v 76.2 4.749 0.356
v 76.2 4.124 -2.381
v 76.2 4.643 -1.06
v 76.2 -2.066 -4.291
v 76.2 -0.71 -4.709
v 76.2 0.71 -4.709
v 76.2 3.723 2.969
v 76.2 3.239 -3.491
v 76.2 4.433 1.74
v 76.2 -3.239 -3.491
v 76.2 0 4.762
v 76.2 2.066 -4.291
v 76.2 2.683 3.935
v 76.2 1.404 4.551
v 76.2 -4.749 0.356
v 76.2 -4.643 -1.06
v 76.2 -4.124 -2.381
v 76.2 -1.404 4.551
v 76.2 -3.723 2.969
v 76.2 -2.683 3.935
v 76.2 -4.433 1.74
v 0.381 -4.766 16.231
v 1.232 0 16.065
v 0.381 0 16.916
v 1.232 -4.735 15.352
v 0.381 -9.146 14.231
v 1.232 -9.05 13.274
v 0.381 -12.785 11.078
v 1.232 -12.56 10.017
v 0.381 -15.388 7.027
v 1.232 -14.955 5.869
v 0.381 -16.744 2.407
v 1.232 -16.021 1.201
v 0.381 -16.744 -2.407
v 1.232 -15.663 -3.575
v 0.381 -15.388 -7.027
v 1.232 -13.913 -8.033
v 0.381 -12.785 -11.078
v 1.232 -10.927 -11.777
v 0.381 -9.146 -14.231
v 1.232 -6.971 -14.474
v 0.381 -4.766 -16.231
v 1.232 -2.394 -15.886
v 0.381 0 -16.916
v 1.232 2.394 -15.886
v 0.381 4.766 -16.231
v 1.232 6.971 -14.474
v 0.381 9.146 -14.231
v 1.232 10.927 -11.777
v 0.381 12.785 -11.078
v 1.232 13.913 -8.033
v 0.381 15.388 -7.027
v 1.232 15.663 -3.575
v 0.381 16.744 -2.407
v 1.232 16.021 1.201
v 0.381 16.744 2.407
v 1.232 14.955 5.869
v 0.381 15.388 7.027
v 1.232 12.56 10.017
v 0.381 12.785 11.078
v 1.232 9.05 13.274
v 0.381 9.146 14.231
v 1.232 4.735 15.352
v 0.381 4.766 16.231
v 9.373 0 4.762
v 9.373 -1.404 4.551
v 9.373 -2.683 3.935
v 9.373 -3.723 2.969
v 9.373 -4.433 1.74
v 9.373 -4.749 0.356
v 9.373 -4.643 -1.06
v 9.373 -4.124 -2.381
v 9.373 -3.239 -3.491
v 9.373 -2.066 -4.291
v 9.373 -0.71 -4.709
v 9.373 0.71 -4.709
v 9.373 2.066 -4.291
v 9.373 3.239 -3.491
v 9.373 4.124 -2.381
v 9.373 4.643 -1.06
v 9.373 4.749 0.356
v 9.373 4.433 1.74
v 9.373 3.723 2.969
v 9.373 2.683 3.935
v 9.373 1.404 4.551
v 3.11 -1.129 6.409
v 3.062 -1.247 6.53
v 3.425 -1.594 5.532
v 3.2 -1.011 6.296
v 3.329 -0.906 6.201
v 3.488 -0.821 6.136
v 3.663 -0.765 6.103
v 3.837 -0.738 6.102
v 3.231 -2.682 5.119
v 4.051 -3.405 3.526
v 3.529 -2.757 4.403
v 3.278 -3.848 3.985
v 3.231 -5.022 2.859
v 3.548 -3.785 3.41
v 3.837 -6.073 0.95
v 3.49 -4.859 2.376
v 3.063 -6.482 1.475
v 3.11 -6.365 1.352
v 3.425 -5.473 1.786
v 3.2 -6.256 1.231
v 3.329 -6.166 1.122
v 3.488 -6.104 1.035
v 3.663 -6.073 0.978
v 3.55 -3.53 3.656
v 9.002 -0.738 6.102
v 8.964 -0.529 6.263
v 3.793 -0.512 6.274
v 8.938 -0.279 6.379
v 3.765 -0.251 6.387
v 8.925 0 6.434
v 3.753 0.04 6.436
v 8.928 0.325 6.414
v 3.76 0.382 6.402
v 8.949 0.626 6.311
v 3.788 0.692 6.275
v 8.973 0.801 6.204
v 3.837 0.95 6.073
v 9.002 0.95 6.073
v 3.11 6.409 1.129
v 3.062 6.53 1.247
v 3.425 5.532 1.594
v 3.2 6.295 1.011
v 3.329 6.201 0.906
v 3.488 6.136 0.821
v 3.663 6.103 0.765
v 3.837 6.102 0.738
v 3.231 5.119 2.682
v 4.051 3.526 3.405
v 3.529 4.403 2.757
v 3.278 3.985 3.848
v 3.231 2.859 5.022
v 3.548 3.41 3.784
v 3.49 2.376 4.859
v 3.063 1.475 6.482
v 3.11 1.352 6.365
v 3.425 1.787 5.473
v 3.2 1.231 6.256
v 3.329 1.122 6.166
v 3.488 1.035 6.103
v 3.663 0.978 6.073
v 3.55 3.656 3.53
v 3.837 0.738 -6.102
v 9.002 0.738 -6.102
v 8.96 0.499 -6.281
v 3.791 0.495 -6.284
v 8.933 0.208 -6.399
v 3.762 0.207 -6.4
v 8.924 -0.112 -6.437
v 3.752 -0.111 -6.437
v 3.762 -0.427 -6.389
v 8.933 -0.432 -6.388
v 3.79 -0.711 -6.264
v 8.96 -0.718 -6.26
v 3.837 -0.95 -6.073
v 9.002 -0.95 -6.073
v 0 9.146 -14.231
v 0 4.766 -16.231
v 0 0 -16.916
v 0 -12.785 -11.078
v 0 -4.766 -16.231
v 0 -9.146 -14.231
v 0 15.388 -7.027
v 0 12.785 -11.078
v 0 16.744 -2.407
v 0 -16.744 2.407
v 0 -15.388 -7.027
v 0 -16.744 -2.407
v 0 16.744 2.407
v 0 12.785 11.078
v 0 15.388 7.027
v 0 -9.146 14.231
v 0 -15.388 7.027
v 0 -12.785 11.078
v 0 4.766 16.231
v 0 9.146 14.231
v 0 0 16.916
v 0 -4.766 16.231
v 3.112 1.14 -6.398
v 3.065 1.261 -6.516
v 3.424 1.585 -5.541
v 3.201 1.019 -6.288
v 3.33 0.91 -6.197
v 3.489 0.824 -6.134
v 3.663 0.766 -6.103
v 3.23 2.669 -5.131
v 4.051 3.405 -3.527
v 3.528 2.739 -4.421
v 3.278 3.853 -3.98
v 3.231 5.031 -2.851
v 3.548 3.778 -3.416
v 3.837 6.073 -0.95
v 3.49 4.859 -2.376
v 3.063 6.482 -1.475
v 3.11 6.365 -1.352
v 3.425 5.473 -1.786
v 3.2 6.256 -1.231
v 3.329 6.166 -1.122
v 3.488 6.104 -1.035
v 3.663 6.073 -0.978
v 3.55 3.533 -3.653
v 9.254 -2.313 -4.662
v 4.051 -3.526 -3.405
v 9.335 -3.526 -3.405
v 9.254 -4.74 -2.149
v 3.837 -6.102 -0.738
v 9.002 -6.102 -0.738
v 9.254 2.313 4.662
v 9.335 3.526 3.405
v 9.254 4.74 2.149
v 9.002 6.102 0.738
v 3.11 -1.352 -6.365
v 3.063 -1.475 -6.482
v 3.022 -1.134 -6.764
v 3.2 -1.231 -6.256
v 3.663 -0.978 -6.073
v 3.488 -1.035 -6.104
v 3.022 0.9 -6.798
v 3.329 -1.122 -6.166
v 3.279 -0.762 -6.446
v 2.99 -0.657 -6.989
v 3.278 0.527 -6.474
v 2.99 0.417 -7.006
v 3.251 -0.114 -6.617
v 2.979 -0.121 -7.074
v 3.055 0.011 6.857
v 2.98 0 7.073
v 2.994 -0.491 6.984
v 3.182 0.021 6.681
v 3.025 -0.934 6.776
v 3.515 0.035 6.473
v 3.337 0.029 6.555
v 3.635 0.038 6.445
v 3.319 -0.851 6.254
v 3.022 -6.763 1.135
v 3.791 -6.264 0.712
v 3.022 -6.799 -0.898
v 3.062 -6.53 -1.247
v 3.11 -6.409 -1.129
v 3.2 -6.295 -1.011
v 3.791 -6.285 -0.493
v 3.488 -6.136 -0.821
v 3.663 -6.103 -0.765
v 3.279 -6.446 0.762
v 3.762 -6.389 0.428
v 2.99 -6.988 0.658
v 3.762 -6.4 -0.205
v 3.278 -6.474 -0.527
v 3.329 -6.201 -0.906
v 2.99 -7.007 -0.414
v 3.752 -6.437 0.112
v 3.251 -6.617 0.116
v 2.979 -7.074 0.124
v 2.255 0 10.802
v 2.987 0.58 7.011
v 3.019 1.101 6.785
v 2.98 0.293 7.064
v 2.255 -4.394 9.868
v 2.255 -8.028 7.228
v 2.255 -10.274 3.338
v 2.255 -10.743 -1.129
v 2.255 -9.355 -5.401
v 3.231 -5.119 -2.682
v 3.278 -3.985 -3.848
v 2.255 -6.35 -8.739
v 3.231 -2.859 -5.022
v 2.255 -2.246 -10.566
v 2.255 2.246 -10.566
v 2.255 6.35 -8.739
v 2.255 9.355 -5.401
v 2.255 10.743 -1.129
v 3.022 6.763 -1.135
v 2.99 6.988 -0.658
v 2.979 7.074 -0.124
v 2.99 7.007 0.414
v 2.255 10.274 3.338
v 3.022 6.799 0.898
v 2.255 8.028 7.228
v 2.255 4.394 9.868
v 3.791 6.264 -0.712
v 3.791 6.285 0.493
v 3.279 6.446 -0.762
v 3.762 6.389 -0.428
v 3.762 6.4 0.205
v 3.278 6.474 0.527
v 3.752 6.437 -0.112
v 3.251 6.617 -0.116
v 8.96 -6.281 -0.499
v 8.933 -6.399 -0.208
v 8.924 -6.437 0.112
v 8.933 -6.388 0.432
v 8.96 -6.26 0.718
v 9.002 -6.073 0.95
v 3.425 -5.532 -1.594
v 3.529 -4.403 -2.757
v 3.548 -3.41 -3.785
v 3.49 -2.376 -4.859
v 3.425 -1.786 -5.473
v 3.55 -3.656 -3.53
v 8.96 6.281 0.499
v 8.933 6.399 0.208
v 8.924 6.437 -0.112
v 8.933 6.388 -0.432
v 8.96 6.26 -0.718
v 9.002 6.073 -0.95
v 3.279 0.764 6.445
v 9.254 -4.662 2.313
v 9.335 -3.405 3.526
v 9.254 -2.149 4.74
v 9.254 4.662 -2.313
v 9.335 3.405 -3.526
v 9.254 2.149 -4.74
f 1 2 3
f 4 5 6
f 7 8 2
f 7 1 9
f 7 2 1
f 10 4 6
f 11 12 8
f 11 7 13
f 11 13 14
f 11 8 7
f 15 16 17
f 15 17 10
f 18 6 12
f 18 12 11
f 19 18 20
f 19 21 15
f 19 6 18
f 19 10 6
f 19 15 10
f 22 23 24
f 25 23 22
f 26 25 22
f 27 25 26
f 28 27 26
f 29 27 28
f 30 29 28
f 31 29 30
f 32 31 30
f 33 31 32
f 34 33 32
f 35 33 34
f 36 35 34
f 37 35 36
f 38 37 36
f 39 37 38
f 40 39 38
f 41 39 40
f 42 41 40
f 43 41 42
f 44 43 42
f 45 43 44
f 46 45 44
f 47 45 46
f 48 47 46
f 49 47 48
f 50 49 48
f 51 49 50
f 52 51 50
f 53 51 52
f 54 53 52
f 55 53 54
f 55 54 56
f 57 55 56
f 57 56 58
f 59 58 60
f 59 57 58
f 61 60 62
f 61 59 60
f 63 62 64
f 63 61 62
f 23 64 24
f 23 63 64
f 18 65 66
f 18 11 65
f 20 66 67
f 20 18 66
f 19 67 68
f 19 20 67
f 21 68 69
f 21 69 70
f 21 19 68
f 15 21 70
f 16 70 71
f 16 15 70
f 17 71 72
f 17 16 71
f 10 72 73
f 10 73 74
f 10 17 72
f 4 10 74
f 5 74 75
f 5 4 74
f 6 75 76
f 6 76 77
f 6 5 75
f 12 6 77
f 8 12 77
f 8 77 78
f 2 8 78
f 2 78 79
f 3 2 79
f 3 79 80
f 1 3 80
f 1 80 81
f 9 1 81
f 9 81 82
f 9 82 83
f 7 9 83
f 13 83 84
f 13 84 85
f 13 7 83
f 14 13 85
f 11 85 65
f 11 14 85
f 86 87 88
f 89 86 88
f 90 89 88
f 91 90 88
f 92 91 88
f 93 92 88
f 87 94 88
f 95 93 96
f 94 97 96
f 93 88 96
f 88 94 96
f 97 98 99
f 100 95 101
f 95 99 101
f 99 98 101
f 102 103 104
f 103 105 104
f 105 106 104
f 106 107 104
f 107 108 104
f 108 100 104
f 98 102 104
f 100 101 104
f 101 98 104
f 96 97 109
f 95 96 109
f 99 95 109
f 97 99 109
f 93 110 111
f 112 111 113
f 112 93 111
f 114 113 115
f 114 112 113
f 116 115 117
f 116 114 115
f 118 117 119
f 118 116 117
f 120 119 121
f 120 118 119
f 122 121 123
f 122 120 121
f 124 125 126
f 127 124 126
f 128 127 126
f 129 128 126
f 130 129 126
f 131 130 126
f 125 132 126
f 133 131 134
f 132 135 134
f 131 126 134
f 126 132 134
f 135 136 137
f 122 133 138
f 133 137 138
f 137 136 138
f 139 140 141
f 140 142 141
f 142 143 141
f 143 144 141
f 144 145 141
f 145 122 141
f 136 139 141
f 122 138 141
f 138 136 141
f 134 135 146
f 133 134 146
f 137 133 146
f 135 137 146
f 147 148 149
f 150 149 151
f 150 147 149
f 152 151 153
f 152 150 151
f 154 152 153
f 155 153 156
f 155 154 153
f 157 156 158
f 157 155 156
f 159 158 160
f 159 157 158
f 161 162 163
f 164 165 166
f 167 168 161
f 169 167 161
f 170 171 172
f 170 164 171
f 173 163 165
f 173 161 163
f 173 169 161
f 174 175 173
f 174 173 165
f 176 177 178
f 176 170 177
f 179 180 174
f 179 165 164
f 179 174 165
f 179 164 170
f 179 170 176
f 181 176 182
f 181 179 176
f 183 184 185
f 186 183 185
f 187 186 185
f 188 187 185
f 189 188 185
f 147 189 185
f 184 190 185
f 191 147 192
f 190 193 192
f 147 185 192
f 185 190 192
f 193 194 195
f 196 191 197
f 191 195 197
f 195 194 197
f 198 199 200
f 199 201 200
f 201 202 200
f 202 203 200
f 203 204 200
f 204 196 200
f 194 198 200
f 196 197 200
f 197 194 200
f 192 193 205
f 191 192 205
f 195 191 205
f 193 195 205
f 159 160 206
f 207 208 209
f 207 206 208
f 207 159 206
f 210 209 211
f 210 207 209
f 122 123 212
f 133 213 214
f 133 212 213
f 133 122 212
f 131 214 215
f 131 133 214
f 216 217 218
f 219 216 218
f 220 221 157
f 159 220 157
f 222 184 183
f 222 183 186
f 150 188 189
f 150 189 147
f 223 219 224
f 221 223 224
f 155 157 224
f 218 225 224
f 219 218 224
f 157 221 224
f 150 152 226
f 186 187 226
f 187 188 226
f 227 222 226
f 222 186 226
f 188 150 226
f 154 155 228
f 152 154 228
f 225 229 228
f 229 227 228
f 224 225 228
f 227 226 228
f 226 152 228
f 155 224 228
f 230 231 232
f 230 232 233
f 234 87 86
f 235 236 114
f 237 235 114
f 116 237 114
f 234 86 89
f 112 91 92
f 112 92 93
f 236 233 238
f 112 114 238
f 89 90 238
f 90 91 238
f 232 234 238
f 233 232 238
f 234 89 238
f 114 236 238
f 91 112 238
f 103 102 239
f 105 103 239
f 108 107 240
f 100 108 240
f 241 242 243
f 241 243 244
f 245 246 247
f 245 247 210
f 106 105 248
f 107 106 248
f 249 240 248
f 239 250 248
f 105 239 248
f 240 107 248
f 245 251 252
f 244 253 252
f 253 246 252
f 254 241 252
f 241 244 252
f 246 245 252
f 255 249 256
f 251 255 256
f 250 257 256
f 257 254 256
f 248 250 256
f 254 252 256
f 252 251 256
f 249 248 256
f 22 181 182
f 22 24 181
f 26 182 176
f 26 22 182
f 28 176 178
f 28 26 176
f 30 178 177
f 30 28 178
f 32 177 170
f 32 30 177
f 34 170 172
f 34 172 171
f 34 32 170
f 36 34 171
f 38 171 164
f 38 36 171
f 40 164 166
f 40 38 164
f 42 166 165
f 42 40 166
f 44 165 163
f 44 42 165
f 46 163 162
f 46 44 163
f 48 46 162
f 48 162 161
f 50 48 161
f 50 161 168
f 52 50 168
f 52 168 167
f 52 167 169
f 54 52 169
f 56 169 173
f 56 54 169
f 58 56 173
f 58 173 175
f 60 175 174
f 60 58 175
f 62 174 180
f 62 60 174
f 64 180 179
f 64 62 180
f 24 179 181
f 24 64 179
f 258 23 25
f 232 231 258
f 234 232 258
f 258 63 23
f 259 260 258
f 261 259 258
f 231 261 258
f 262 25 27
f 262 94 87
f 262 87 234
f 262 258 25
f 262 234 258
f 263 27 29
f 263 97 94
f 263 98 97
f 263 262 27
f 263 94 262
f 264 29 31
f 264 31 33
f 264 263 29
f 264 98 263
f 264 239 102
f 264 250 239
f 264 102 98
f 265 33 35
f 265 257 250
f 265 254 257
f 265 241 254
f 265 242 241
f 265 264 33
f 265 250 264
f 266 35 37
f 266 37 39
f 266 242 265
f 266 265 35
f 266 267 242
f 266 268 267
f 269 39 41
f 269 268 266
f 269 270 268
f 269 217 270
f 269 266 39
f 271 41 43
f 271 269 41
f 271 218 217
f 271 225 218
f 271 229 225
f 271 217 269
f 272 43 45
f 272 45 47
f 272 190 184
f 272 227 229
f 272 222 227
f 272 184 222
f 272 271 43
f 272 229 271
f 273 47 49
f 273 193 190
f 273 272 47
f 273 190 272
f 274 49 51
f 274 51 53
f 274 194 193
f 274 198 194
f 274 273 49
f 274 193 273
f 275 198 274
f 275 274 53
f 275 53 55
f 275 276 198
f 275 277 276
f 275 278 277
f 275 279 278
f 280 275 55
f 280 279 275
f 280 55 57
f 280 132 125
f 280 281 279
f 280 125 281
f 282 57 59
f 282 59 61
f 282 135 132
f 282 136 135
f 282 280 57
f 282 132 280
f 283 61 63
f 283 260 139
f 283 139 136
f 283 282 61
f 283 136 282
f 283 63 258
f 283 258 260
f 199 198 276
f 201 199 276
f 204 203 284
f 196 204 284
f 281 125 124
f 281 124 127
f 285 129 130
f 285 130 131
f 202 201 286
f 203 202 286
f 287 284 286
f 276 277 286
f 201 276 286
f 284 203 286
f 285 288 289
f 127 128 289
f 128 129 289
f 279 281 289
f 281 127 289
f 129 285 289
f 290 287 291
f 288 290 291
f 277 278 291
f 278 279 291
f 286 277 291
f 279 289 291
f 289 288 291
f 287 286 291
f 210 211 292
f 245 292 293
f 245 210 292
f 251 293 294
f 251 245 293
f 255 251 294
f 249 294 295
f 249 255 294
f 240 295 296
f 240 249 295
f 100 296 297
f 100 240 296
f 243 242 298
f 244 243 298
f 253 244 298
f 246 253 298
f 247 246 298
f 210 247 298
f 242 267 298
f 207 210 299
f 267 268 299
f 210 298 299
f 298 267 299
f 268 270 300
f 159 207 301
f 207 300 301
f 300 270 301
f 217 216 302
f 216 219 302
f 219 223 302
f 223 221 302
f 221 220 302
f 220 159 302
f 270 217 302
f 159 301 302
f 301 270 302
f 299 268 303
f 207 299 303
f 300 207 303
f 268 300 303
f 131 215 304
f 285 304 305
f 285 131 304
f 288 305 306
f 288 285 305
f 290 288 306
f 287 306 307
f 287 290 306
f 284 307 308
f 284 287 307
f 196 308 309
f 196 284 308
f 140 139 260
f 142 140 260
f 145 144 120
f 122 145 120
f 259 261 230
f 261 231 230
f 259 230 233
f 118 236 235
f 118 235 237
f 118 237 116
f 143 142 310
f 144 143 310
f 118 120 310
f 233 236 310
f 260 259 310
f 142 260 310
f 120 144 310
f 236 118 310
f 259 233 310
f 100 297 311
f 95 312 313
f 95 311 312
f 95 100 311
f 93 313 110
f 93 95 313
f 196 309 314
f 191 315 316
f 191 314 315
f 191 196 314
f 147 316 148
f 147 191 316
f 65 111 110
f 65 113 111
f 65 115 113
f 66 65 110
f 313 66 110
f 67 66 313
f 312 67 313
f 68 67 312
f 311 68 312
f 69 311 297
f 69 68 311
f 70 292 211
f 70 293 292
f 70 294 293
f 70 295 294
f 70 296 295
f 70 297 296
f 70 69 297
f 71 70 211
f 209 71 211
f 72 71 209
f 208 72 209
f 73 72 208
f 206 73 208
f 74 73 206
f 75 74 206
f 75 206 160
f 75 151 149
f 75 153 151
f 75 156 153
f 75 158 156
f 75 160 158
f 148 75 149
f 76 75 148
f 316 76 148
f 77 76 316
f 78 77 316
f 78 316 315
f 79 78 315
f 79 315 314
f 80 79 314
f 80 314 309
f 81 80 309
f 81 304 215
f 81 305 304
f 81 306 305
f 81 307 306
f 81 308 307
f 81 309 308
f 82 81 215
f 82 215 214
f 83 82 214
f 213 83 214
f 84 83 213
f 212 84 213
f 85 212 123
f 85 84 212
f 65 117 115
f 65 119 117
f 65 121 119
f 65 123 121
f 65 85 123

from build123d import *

# Parameters (mm, degrees)
NECK_DEPTH   = 9.3726
HEADFILLET_R = 0.7874


with BuildPart() as part:
    # BodySke → BaseBody (revolve)
    with BuildSketch(Plane.XY, mode=Mode.PRIVATE) as basebody_sk:
        Polygon((0, 0), (0, 16.9164), (0.381, 16.9164), (1.231924038, 16.065475962), (3.429, 4.7625), (76.2, 4.7625), (76.2, 0), align=None)
    revolve(basebody_sk.sketch.rotate(Axis((-6.35, 0, 0), (1, 0, 0)), 90), axis=Axis((-6.35, 0, 0), (1, 0, 0)))

    # Sketch2 → Neck (add)
    with BuildSketch(Plane(origin=(0, 0, 0), x_dir=(0, 0.6946583704589985, -0.7193398003386501), z_dir=(1, 0, 0))):
        with BuildLine():
            Line((3.7084, -4.9022), (-3.7084, -4.9022))
            ThreePointArc((-3.7084, -4.9022), (-4.552544075, -4.552544075), (-4.9022, -3.7084))
            Line((-4.9022, -3.7084), (-4.9022, 3.7084))
            ThreePointArc((-4.9022, 3.7084), (-4.552544075, 4.552544075), (-3.7084, 4.9022))
            Line((-3.7084, 4.9022), (3.7084, 4.9022))
            ThreePointArc((3.7084, 4.9022), (4.552544075, 4.552544075), (4.9022, 3.7084))
            Line((4.9022, 3.7084), (4.9022, -3.7084))
            ThreePointArc((4.9022, -3.7084), (4.552544075, -4.552544075), (3.7084, -4.9022))
        make_face()
    extrude(amount=NECK_DEPTH)

    # Sketch3 → NeckChamfer (revolve, cut)
    with BuildSketch(Plane.XY, mode=Mode.PRIVATE) as neckchamfer_sk:
        Polygon((2.713017566, 29.6164), (9.3726, 4.7625), (9.6266, 4.7625), (9.6266, 29.6164), align=None)
    revolve(neckchamfer_sk.sketch.rotate(Axis((0, 0, 0), (1, 0, 0)), 90), axis=Axis((0, 0, 0), (1, 0, 0)), mode=Mode.SUBTRACT)

    # HeadFillet
    headfillet_edges = [part.edges().sort_by_distance(p)[0] for p in [
        (3.401845071, 3.405354264, -3.526347569),
        (3.103263392, -0.112363299, -6.437288995),
        (3.401845071, -3.526347569, -3.405354264),
        (3.103263392, -6.437288995, 0.112363299),
        (3.401845071, -3.405354264, 3.526347569),
        (3.121431163, -0.398458833, 6.332280366),
        (3.401845071, 3.526347569, 3.405354264),
        (3.103263392, 6.437288995, -0.112363299),
    ]]
    fillet(headfillet_edges, radius=HEADFILLET_R)


solid = part.part
